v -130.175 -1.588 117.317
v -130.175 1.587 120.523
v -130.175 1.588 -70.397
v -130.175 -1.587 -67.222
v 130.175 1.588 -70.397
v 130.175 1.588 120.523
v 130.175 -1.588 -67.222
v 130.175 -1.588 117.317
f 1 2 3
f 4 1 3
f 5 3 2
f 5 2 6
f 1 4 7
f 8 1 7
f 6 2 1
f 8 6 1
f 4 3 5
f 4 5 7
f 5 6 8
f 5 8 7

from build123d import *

# Parameters (mm, degrees)
SKETCH1_W           = 260.35
SKETCH1_H           = 241.046
BOSS_EXTRUDE1_DEPTH = 1.5875
CUT_EXTRUDE2_DEPTH  = 261.35
CUT_EXTRUDE3_DEPTH  = 261.35


with BuildPart() as part:
    # Sketch1 → Boss-Extrude1 (new body, symmetric)
    with BuildSketch(Plane(origin=(0, 0, 0), x_dir=(1, 0, 0), z_dir=(0, 1, 0))):
        Rectangle(SKETCH1_W, SKETCH1_H)
    extrude(amount=BOSS_EXTRUDE1_DEPTH, both=True)

    # Sketch3 → Cut-Extrude2 (cut, through all)
    with BuildSketch(Plane.ZY.offset(130.175)):
        Polygon((120.523, 1.5875), (117.316753604, -1.5875), (181.759591699, -66.664544845), (184.965838095, -63.489544845), align=None)
        Polygon((-120.523, 1.5875), (-115.936493069, -2.999006931), (-117.69089956, -4.753413422), (-122.277406491, -0.166906491), align=None)
    extrude(amount=-CUT_EXTRUDE2_DEPTH, mode=Mode.SUBTRACT)

    # Sketch4 → Cut-Extrude3 (cut, through all)
    with BuildSketch(Plane.ZY.offset(130.175)):
        Polygon((-95.828811288, 27.019066154), (-49.030213399, -19.779531735), (-139.395977622, -13.401975952), align=None)
    extrude(amount=-CUT_EXTRUDE3_DEPTH, mode=Mode.SUBTRACT)


solid = part.part
